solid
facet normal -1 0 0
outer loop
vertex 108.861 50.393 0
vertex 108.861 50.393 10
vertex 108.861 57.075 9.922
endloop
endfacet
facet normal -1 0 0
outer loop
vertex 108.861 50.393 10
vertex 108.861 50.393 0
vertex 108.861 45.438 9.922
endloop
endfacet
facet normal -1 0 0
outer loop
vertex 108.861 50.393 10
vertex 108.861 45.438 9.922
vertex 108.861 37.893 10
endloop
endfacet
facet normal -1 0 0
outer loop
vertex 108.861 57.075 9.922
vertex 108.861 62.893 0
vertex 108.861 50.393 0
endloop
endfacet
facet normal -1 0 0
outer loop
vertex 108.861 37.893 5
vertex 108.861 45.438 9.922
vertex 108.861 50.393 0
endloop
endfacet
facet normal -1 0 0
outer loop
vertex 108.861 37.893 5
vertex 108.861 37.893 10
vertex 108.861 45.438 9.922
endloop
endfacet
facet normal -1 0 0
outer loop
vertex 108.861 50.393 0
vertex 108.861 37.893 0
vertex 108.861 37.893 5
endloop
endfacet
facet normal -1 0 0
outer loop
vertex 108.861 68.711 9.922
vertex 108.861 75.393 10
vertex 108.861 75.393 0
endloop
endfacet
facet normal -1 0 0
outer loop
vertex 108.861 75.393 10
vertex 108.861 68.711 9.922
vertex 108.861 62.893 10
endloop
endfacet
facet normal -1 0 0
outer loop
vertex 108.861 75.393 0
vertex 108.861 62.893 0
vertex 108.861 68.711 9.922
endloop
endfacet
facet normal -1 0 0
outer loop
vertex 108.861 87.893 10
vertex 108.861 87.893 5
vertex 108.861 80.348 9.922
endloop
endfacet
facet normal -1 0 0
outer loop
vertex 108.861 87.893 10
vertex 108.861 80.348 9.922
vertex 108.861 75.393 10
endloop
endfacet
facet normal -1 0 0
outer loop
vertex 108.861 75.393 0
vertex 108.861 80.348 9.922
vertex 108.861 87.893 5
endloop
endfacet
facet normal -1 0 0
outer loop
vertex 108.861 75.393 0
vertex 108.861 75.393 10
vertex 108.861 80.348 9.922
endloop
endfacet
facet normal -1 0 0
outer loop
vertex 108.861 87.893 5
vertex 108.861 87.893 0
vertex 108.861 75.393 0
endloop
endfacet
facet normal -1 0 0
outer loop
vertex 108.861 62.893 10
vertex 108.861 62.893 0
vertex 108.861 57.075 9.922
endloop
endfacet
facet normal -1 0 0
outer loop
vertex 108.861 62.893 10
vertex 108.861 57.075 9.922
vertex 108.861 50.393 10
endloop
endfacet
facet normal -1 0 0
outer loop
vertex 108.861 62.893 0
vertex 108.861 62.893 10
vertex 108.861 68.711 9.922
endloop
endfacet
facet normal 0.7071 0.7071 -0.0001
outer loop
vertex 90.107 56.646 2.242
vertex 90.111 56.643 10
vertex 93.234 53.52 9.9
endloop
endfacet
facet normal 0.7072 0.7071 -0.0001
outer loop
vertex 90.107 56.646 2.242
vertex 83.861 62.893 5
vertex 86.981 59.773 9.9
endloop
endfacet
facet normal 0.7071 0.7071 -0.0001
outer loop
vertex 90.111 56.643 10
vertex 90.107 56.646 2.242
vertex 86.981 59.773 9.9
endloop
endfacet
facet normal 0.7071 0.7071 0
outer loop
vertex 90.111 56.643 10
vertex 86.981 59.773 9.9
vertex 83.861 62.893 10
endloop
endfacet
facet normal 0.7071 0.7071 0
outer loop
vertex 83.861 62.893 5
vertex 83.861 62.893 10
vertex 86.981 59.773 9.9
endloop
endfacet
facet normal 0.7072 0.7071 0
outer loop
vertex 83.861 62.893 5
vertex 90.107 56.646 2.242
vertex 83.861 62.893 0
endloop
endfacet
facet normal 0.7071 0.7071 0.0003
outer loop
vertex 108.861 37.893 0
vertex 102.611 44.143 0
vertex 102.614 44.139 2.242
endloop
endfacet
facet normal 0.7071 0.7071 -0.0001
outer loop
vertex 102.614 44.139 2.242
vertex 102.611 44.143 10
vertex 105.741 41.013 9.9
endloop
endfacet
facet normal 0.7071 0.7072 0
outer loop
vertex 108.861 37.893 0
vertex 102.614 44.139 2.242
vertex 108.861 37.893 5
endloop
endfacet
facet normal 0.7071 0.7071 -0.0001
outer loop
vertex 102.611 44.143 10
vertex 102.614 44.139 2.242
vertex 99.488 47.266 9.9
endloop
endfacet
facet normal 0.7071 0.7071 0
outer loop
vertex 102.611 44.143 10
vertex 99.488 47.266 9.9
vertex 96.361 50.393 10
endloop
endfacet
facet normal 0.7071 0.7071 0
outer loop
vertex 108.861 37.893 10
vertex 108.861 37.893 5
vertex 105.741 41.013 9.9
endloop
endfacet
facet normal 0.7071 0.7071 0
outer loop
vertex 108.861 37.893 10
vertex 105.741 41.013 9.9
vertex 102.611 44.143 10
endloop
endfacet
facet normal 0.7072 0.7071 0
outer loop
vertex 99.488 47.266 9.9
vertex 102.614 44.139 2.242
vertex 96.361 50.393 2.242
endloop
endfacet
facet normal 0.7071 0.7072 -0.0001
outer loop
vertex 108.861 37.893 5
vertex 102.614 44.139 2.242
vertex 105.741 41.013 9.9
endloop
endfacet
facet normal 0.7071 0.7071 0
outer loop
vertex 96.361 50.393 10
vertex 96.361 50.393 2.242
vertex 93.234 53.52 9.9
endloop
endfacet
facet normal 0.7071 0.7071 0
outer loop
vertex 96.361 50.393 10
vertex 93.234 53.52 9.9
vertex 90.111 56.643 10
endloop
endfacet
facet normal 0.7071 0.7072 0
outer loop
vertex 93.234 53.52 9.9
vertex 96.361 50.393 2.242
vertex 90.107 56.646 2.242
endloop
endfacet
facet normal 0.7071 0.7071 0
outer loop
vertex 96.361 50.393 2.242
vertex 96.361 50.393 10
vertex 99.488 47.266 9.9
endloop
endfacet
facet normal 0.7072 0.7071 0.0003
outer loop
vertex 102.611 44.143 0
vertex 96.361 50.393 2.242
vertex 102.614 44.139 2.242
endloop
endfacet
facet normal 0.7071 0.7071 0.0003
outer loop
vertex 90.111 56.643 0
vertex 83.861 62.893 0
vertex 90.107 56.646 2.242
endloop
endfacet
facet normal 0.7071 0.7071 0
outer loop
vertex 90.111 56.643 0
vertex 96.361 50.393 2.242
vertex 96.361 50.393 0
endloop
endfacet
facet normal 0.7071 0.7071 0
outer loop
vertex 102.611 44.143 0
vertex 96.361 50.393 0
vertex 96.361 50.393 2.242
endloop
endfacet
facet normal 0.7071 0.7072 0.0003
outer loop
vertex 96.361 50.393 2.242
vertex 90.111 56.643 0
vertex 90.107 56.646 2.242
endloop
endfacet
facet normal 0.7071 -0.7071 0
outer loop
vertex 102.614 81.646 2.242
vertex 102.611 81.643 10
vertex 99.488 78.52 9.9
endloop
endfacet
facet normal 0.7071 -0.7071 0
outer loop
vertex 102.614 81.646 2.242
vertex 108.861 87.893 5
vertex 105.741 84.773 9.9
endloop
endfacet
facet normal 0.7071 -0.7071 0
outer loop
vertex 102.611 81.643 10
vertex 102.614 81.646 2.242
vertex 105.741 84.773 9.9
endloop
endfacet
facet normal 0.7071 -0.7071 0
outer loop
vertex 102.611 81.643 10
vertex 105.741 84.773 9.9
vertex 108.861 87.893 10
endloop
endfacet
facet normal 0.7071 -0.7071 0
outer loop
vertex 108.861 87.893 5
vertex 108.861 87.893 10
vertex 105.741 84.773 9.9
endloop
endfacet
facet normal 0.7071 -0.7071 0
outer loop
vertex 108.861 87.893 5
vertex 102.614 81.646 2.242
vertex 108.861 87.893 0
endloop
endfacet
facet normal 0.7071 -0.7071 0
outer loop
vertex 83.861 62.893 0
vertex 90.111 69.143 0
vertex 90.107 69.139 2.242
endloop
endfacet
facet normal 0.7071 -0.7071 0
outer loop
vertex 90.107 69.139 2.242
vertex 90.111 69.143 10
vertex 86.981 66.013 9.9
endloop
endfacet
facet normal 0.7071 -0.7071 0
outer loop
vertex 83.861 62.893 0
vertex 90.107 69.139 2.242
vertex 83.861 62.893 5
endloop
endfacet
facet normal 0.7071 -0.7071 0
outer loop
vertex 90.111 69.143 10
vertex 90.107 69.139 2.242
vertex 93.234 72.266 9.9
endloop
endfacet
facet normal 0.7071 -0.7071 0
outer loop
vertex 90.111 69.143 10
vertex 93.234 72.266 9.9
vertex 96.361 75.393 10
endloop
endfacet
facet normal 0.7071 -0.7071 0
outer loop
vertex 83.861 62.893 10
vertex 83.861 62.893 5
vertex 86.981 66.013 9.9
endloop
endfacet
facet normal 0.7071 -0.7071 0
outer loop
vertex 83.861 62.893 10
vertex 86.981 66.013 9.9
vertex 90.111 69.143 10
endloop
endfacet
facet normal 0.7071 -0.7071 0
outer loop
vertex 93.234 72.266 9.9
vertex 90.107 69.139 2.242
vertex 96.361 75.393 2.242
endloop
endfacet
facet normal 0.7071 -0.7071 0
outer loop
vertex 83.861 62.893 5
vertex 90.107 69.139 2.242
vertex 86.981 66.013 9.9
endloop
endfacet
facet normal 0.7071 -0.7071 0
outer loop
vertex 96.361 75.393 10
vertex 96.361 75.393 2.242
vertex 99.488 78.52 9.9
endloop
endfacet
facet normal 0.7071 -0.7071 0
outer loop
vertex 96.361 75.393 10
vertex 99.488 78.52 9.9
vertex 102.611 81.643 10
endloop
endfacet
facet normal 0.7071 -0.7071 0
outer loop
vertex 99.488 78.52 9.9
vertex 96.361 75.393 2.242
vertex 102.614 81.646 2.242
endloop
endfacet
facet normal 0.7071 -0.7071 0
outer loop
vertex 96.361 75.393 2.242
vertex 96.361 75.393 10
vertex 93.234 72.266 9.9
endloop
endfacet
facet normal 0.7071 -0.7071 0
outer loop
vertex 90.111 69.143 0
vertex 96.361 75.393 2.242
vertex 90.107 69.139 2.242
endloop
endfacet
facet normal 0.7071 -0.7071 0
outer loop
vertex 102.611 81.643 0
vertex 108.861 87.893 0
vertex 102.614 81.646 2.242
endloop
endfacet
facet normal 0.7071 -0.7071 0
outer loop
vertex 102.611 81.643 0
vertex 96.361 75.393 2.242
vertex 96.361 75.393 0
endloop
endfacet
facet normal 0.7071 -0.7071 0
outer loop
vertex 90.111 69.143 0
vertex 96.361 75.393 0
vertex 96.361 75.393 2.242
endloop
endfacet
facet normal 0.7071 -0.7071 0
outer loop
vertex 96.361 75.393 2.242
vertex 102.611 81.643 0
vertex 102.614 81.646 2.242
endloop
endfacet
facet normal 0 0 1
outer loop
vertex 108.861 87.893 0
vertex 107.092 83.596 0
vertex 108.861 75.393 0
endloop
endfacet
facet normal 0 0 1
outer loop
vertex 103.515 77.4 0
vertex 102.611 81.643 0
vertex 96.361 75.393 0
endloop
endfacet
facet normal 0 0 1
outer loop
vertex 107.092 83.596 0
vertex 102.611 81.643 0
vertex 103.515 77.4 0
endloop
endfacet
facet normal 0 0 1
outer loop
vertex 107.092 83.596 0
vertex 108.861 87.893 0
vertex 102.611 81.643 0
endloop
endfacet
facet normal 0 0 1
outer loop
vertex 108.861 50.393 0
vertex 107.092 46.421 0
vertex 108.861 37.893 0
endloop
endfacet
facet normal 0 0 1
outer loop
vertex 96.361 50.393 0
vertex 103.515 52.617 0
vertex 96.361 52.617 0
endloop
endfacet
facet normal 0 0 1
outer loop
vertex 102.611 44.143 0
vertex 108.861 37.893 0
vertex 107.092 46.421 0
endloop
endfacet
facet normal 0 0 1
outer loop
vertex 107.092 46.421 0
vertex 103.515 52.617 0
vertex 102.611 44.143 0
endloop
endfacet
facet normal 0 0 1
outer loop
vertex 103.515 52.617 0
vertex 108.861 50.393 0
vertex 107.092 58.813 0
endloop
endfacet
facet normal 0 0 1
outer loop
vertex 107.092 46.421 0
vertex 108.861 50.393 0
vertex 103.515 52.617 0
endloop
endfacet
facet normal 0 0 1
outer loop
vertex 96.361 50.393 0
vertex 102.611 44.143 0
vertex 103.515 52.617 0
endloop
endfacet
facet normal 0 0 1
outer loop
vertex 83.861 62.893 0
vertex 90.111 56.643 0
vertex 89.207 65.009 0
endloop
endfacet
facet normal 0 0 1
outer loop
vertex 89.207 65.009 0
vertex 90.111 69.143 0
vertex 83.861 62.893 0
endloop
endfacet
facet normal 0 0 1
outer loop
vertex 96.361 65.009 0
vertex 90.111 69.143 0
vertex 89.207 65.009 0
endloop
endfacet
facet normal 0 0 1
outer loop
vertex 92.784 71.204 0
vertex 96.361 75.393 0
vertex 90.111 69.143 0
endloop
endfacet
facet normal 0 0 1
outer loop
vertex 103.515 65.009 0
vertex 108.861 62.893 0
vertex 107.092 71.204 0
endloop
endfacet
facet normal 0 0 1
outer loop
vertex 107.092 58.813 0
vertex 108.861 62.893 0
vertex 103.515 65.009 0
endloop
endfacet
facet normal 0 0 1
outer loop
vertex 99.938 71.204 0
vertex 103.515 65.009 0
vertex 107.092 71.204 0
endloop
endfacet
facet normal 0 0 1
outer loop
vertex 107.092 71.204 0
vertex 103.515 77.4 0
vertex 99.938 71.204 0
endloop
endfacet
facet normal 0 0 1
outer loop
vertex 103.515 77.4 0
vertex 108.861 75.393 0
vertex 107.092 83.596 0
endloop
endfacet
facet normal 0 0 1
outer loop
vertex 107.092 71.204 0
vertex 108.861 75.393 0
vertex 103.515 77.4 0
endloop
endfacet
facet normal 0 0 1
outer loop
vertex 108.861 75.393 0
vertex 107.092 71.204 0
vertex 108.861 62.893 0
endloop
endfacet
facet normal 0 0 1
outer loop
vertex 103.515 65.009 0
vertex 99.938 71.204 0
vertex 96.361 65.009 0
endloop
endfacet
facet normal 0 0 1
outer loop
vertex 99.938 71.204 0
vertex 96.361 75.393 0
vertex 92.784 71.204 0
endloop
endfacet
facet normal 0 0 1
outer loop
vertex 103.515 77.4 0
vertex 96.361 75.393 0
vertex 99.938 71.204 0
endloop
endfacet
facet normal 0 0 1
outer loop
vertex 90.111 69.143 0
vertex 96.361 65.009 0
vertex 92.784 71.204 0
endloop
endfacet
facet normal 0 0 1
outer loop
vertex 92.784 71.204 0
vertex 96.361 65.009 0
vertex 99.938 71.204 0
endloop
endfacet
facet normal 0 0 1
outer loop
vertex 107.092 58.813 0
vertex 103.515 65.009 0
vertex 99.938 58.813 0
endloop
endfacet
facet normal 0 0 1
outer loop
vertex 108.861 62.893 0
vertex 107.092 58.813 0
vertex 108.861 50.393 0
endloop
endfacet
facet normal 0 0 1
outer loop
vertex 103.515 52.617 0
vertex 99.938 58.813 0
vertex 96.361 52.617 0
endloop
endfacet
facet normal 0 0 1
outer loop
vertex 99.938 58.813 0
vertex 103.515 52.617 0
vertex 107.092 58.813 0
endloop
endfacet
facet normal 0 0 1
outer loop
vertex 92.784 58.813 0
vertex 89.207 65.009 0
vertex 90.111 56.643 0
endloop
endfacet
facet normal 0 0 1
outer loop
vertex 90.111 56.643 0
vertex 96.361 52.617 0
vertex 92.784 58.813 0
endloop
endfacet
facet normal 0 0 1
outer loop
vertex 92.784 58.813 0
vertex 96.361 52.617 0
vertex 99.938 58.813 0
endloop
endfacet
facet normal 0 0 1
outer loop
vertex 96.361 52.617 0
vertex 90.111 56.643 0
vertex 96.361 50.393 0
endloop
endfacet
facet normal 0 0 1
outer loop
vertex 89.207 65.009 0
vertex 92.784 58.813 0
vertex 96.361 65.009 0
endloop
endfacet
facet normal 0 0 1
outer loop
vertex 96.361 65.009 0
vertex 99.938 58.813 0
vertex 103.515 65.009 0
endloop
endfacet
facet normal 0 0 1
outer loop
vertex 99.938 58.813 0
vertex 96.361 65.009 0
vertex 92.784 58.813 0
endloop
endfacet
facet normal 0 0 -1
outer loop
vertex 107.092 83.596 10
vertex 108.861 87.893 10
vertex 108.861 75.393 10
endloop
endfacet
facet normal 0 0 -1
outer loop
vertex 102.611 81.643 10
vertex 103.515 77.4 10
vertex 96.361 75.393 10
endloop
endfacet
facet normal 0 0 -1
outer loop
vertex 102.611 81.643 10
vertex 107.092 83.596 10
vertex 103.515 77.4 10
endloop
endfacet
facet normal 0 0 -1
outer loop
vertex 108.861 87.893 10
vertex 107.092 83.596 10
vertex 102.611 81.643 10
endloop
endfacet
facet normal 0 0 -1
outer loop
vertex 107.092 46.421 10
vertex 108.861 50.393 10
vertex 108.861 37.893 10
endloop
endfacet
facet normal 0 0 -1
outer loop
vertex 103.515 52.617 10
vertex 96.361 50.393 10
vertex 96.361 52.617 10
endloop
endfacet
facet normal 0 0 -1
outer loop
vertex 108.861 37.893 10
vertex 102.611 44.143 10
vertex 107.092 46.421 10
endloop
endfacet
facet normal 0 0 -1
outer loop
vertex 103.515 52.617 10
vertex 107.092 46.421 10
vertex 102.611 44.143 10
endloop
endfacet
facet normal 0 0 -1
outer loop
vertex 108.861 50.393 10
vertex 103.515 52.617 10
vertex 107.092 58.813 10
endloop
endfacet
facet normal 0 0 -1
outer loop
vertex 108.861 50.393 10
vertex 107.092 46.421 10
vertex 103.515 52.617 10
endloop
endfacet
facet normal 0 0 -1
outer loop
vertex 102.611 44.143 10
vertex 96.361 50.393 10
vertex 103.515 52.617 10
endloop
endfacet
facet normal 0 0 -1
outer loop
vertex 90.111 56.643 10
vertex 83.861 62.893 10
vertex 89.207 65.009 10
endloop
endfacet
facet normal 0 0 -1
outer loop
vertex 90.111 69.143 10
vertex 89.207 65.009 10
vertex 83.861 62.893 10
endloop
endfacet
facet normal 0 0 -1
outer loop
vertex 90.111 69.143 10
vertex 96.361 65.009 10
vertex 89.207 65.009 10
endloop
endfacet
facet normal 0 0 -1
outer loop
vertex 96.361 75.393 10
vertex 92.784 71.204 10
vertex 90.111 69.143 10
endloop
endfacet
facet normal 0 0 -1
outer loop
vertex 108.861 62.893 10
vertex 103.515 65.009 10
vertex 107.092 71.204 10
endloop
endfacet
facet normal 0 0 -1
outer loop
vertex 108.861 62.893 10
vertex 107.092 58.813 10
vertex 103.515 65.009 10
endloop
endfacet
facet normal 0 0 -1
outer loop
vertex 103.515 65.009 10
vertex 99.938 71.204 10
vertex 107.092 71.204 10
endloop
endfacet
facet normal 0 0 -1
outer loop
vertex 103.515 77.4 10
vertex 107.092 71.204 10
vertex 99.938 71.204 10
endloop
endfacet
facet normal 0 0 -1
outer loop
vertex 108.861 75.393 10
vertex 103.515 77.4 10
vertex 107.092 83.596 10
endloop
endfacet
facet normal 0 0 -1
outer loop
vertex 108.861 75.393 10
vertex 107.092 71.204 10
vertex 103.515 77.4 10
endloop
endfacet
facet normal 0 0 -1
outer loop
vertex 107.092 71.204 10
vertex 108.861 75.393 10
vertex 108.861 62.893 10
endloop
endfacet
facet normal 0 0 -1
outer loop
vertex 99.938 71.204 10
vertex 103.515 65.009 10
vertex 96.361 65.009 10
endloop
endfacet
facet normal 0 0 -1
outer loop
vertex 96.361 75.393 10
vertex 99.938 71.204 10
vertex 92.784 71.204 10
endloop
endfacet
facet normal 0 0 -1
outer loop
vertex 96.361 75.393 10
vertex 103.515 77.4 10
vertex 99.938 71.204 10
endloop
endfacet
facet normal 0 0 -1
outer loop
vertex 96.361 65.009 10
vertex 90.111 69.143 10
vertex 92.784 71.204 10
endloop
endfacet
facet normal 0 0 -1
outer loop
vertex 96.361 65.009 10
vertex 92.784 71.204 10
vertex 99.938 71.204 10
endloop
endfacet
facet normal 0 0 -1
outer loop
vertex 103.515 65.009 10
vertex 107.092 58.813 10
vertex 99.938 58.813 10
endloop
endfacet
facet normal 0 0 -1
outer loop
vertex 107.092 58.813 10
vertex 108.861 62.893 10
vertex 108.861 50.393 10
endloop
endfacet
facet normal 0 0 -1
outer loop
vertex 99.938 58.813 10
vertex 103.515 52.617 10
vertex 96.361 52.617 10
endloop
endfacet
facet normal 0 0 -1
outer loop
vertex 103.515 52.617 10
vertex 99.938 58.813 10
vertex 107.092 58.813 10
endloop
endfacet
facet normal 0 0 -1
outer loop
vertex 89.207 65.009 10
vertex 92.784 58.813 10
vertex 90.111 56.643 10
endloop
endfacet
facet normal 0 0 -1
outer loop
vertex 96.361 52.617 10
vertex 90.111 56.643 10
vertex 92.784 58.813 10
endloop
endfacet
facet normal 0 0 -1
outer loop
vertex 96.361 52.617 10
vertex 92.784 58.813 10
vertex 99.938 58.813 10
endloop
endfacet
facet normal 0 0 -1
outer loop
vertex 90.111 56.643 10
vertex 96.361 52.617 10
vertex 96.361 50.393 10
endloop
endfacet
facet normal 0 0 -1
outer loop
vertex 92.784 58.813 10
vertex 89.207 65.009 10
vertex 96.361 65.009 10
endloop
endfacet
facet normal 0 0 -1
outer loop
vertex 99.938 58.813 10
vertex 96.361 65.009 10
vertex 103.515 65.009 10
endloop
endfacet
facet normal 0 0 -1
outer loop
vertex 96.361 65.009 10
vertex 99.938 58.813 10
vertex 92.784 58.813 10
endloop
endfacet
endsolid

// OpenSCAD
// CSG file generated from FreeCAD 0.20.29177 (Git)
group() {
 group(){
polyhedron ( points = [[108.860870,87.892876,0.000000],[108.860870,87.892876,10.000000],[108.860870,37.892879,0.000000],[108.860870,37.892879,10.000000],[83.860870,62.892879,0.000000],[83.860870,62.892879,10.000000],[108.860870,87.892876,5.000000],[108.860870,37.892879,5.000000],[108.860870,75.392876,0.000000],[108.860870,62.892879,0.000000],[108.860870,50.392879,0.000000],[108.860870,75.392876,10.000000],[108.860870,62.892879,10.000000],[108.860870,50.392879,10.000000],[83.860870,62.892879,5.000000],[102.610870,44.142879,0.000000],[96.360870,50.392879,0.000000],[90.110870,56.642879,0.000000],[102.610870,44.142879,10.000000],[96.360870,50.392879,10.000000],[90.110870,56.642879,10.000000],[90.110870,69.142876,0.000000],[96.360870,75.392876,0.000000],[102.610870,81.642876,0.000000],[90.110870,69.142876,10.000000],[96.360870,75.392876,10.000000],[102.610870,81.642876,10.000000],[108.860870,45.437752,9.922277],[108.860870,57.074505,9.922277],[108.860870,68.711258,9.922277],[108.860870,80.348007,9.922277],[102.614288,44.139454,2.241523],[90.107445,56.646305,2.241523],[86.980728,59.773018,9.900373],[93.234154,53.519592,9.900373],[99.487579,47.266167,9.900373],[105.741005,41.012741,9.900373],[96.360870,50.392879,2.241523],[90.107445,69.139458,2.241523],[102.614288,81.646301,2.241523],[105.741005,84.773018,9.900373],[99.487579,78.519592,9.900373],[93.234154,72.266167,9.900373],[86.980728,66.012741,9.900373],[96.360870,75.392876,2.241523],[96.360870,52.616894,0.000000],[89.206566,65.008507,0.000000],[103.515167,65.008507,0.000000],[107.092323,83.595940,0.000000],[103.515167,77.400131,0.000000],[107.092323,46.421082,0.000000],[103.515167,52.616894,0.000000],[92.783714,71.204323,0.000000],[107.092323,58.812702,0.000000],[99.938019,71.204323,0.000000],[107.092323,71.204323,0.000000],[96.360870,65.008507,0.000000],[99.938019,58.812702,0.000000],[92.783714,58.812702,0.000000],[96.360870,52.616894,10.000000],[89.206566,65.008507,10.000000],[103.515167,65.008507,10.000000],[107.092323,83.595940,10.000000],[103.515167,77.400131,10.000000],[107.092323,46.421082,10.000000],[103.515167,52.616894,10.000000],[92.783714,71.204323,10.000000],[107.092323,58.812702,10.000000],[99.938019,71.204323,10.000000],[107.092323,71.204323,10.000000],[96.360870,65.008507,10.000000],[99.938019,58.812702,10.000000],[92.783714,58.812702,10.000000]], faces = [[28,13,10],[27,10,13],[3,27,13],[10,9,28],[10,27,7],[27,3,7],[7,2,10],[8,11,29],[12,29,11],[29,9,8],[30,6,1],[11,30,1],[6,30,8],[30,11,8],[8,0,6],[28,9,12],[13,28,12],[29,12,9],[34,20,32],[33,14,32],[33,32,20],[5,33,20],[33,5,14],[4,32,14],[31,15,2],[36,18,31],[7,31,2],[35,31,18],[19,35,18],[36,7,3],[18,36,3],[37,31,35],[36,31,7],[34,37,19],[20,34,19],[32,37,34],[35,19,37],[31,37,15],[32,4,17],[16,37,17],[37,16,15],[32,17,37],[41,26,39],[40,6,39],[40,39,26],[1,40,26],[40,1,6],[0,39,6],[38,21,4],[43,24,38],[14,38,4],[42,38,24],[25,42,24],[43,14,5],[24,43,5],[44,38,42],[43,38,14],[41,44,25],[26,41,25],[39,44,41],[42,25,44],[38,44,21],[39,0,23],[22,44,23],[44,22,21],[39,23,44],[8,48,0],[22,23,49],[49,23,48],[23,0,48],[2,50,10],[45,51,16],[50,2,15],[15,51,50],[53,10,51],[51,10,50],[51,15,16],[46,17,4],[4,21,46],[46,21,56],[21,22,52],[55,9,47],[47,9,53],[55,47,54],[54,49,55],[48,8,49],[49,8,55],[9,55,8],[56,54,47],[52,22,54],[54,22,49],[52,56,21],[54,56,52],[57,47,53],[10,53,9],[45,57,51],[53,51,57],[17,46,58],[58,45,17],[57,45,58],[16,17,45],[56,58,46],[47,57,56],[58,56,57],[11,1,62],[25,63,26],[63,62,26],[26,62,1],[3,13,64],[59,19,65],[64,18,3],[18,64,65],[67,65,13],[65,64,13],[65,19,18],[60,5,20],[5,60,24],[60,70,24],[24,66,25],[69,61,12],[61,67,12],[69,68,61],[68,69,63],[62,63,11],[63,69,11],[12,11,69],[70,61,68],[66,68,25],[68,63,25],[66,24,70],[68,66,70],[71,67,61],[13,12,67],[59,65,71],[67,71,65],[20,72,60],[72,20,59],[71,72,59],[19,59,20],[70,60,72],[61,70,71],[72,71,70]]);
}
}
